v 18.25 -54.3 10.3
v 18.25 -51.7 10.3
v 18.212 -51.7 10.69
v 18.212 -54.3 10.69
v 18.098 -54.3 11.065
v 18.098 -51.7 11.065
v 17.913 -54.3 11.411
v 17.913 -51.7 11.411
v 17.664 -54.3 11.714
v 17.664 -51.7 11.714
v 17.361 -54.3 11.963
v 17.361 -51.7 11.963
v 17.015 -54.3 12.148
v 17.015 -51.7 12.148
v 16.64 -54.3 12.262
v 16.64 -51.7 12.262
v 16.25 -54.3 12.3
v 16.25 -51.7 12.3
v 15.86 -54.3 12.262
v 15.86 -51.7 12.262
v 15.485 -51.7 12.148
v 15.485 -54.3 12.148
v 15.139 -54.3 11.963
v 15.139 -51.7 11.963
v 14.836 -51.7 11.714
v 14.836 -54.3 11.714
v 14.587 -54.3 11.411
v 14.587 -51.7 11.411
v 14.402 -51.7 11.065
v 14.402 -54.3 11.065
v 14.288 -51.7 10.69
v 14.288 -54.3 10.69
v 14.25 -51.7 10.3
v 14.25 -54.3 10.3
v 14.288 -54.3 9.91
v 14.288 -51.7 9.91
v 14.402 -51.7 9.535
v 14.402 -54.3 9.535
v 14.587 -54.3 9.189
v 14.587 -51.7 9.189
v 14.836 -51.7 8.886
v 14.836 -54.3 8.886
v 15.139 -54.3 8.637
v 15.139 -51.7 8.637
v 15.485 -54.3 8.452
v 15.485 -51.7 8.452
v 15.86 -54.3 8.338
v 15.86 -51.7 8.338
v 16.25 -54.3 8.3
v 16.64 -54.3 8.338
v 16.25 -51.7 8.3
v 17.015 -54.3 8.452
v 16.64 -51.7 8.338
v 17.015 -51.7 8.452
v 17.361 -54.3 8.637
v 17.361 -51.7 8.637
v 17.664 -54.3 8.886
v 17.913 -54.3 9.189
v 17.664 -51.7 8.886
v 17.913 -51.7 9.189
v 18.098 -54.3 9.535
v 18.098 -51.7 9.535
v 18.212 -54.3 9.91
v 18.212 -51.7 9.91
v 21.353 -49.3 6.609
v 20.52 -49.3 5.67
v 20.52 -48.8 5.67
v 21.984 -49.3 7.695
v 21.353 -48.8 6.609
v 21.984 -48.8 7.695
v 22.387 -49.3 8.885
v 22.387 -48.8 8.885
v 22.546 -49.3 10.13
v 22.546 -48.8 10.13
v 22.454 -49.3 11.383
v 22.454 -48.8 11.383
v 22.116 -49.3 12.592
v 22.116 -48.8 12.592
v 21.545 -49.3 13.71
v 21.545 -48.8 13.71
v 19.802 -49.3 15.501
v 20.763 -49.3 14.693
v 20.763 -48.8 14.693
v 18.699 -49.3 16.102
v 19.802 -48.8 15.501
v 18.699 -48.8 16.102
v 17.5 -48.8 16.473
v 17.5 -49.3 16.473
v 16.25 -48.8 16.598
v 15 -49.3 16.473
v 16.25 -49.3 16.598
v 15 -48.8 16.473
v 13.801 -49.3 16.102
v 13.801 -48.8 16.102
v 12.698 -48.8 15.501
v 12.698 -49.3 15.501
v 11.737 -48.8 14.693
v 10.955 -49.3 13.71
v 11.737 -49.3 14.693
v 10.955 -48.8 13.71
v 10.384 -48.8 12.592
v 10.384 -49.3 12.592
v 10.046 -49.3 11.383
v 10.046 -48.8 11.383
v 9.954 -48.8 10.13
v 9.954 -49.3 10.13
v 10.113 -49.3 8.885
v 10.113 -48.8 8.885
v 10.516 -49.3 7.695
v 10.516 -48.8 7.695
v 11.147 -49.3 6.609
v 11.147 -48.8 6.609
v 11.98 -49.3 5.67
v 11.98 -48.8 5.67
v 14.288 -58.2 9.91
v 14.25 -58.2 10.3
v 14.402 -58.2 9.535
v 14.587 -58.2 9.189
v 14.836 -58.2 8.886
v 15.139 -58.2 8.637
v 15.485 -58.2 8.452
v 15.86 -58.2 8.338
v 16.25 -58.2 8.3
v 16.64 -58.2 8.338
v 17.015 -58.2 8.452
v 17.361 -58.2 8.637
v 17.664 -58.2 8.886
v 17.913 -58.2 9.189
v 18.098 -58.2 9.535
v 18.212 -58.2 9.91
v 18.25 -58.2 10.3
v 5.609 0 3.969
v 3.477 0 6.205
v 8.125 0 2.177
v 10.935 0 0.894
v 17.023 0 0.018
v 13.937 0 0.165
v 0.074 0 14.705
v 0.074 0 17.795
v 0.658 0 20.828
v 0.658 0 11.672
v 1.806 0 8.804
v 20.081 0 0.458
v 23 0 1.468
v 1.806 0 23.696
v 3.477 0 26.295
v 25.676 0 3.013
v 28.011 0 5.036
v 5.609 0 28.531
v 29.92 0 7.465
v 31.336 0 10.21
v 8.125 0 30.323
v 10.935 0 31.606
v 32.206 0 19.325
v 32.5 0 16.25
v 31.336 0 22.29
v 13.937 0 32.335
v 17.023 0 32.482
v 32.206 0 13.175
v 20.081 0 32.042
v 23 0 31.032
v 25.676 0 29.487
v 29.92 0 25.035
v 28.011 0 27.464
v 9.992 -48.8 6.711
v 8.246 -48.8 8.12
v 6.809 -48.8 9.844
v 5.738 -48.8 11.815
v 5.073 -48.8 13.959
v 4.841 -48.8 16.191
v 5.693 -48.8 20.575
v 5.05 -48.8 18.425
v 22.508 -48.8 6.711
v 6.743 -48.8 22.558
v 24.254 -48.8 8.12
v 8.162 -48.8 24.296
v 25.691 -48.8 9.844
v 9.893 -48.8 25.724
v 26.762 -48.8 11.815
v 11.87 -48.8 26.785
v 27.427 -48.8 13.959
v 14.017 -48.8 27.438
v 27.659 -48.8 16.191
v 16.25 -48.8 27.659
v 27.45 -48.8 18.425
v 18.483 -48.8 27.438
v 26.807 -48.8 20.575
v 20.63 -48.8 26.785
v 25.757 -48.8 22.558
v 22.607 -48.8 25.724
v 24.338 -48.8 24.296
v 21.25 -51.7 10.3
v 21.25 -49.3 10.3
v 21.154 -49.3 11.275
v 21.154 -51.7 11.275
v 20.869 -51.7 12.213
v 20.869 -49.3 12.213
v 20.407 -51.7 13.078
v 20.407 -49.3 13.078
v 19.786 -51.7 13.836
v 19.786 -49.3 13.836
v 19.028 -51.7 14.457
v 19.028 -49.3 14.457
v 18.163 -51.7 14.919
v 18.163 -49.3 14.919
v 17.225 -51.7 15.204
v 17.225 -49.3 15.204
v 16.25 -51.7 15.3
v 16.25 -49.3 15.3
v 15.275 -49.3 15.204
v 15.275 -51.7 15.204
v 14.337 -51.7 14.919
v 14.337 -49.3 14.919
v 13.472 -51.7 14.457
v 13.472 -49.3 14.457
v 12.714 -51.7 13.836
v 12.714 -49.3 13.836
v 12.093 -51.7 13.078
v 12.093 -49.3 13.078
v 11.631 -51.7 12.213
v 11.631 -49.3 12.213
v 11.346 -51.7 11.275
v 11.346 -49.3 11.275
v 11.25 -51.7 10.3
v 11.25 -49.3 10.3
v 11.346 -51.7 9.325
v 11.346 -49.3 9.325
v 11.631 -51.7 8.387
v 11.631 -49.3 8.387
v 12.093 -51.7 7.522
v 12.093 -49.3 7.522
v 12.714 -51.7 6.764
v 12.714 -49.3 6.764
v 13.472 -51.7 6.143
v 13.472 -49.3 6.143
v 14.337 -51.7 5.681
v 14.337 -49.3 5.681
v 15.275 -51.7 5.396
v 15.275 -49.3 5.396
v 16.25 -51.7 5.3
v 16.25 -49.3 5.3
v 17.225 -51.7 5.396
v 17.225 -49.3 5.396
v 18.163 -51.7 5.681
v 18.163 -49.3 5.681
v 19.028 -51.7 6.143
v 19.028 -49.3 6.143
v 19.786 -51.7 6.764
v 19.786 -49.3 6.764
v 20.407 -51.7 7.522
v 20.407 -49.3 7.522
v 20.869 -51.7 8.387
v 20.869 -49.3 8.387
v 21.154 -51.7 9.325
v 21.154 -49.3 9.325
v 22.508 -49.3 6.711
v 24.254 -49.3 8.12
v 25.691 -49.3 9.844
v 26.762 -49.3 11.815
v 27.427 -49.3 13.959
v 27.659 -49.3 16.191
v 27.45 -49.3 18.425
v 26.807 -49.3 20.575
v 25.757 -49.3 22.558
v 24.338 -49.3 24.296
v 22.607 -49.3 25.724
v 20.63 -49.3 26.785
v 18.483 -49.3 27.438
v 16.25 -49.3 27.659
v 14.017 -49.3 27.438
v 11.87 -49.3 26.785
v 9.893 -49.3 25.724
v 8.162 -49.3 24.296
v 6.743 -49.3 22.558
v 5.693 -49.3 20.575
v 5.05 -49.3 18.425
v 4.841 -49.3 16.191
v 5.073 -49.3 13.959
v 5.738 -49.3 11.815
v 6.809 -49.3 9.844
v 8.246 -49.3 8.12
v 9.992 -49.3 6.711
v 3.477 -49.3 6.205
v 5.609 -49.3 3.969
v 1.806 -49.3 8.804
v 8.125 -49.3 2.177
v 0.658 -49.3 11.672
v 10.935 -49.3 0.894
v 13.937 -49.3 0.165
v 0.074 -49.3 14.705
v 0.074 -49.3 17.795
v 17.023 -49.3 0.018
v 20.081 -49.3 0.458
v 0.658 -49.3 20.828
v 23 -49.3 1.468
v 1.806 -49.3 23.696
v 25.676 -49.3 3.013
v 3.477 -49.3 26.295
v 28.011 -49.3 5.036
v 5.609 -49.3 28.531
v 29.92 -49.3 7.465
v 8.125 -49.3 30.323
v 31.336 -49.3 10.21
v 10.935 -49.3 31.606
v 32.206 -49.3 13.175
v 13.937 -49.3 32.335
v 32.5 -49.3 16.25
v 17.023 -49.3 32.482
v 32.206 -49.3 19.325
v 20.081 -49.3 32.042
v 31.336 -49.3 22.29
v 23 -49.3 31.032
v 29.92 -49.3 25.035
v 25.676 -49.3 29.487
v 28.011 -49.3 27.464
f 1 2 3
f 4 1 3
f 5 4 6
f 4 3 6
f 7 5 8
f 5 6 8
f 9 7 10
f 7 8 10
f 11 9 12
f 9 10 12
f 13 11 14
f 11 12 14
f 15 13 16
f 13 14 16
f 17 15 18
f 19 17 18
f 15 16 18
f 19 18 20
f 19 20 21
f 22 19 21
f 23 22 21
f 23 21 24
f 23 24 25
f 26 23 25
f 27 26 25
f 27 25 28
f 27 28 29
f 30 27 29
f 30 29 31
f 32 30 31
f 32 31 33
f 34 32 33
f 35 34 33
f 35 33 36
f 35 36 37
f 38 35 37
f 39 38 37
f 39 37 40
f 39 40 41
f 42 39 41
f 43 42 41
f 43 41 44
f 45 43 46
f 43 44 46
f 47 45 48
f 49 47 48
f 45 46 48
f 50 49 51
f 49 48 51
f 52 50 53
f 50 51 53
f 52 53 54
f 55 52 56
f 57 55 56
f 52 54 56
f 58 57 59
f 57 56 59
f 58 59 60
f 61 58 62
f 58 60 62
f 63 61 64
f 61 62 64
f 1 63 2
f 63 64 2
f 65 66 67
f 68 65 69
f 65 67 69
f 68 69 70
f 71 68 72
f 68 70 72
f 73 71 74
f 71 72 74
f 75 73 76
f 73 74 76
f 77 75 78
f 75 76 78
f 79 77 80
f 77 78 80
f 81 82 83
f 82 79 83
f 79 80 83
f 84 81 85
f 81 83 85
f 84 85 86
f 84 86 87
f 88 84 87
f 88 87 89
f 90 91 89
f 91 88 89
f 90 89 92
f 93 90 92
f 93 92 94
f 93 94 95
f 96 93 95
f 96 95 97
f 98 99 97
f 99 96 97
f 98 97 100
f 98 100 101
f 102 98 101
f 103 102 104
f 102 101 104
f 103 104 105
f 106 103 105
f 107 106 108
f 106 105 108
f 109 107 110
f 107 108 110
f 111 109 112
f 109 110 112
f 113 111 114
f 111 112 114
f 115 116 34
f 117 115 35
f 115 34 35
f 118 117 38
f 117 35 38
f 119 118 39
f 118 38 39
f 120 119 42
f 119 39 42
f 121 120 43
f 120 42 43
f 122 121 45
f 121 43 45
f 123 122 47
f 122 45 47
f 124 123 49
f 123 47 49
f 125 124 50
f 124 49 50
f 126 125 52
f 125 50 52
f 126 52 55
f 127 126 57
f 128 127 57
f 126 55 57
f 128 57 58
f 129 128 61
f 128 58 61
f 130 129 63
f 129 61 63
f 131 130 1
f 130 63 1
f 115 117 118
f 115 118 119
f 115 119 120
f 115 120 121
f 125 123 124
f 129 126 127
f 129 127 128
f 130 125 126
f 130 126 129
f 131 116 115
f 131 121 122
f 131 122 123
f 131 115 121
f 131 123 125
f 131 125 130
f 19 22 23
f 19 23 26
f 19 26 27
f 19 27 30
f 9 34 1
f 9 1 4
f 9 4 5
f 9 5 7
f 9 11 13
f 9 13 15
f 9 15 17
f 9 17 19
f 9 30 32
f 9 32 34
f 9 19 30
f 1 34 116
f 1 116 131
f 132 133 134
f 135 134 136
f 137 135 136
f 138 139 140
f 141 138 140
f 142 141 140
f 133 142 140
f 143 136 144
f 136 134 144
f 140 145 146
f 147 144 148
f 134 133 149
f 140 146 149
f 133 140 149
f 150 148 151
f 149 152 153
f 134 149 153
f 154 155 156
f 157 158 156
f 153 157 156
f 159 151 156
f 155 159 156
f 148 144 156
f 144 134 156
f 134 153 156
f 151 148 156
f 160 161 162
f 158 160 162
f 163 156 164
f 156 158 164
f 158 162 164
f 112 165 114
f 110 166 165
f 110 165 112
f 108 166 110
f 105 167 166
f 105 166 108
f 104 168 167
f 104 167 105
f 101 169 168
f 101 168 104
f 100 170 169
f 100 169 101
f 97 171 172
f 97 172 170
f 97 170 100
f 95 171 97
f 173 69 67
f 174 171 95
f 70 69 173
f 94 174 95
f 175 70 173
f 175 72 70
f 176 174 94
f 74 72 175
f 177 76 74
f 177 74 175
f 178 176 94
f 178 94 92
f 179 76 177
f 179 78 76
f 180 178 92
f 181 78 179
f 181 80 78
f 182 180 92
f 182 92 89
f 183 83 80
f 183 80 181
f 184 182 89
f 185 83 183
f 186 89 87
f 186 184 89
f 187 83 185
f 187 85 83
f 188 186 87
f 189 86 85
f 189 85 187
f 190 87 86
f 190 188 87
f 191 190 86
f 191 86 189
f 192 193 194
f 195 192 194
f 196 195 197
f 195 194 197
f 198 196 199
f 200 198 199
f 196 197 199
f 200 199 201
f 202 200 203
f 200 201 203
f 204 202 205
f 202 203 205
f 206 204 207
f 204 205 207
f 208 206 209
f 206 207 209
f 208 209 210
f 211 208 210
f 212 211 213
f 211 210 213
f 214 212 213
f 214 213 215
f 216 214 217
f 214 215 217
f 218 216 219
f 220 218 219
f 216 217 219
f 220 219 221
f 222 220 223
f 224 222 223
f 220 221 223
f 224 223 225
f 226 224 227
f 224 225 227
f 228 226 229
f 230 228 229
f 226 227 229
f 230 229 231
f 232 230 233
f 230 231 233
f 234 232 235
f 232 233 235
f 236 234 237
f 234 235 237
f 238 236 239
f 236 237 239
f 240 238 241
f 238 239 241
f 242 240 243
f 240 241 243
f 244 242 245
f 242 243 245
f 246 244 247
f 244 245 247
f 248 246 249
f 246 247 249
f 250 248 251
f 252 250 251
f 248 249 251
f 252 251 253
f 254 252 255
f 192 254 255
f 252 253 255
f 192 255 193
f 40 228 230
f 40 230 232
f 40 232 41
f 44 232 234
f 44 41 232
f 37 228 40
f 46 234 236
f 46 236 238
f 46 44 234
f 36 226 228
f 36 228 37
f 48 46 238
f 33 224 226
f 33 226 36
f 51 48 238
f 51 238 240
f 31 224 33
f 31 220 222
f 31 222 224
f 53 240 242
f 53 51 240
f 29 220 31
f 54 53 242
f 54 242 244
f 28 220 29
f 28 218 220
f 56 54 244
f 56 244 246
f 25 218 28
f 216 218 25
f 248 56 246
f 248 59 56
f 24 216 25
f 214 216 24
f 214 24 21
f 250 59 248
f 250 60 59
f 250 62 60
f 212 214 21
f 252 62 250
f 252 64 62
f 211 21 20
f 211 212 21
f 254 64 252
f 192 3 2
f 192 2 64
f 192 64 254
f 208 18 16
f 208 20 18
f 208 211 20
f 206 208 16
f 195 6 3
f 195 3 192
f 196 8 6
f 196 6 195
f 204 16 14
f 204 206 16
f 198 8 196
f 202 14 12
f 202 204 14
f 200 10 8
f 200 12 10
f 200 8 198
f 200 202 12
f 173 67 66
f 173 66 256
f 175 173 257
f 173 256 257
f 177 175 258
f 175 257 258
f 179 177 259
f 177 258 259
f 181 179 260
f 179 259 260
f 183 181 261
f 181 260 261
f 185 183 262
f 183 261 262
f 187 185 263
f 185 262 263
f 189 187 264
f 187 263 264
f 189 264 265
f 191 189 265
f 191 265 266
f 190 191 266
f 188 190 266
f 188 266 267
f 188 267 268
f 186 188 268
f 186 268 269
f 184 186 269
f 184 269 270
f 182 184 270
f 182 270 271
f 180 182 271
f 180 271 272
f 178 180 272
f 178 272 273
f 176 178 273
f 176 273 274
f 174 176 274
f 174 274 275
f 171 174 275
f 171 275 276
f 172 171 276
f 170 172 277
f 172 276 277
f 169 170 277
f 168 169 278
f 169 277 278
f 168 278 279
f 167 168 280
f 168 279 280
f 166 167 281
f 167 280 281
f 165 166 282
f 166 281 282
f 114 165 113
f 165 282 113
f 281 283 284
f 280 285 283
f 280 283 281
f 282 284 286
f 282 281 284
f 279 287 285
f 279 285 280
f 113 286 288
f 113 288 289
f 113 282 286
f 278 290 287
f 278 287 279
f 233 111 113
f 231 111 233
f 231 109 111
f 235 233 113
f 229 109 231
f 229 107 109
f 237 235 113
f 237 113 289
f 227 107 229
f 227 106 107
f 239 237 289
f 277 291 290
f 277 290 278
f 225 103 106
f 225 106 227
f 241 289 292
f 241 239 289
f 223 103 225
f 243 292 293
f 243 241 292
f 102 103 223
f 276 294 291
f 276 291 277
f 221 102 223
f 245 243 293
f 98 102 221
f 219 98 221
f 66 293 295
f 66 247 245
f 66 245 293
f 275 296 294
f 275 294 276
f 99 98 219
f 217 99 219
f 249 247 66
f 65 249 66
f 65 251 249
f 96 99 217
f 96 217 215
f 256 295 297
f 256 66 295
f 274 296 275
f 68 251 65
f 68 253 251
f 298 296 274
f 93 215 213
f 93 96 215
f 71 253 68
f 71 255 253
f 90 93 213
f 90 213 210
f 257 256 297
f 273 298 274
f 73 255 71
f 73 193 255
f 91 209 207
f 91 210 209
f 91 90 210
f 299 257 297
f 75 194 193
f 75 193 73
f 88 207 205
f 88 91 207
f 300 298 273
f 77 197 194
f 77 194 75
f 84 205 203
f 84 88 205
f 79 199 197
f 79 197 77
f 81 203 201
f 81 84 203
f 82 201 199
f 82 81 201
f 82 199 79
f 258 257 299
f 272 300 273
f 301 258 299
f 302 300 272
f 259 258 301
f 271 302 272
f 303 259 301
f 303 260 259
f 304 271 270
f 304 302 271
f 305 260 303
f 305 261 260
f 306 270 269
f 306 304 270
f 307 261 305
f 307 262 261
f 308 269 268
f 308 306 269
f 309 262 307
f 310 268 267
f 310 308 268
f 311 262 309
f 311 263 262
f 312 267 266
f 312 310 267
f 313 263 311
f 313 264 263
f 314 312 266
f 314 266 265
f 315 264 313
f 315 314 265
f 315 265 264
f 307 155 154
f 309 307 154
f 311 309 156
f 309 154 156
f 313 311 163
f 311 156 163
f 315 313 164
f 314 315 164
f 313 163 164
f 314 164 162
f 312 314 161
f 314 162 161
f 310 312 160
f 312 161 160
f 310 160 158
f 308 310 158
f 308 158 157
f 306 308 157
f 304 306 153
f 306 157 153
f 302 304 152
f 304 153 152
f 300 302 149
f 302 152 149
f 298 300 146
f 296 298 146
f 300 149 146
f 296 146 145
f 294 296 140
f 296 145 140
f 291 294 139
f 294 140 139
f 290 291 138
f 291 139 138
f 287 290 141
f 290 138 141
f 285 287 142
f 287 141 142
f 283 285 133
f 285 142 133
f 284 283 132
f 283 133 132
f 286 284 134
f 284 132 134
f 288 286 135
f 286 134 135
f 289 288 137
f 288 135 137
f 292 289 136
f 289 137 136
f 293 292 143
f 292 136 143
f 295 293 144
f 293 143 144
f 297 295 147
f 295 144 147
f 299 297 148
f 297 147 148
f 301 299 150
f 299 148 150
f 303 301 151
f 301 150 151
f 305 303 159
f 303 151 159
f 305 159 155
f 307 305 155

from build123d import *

# Parameters (mm, degrees)
SKETCH001_R  = 16.25
PAD001_DEPTH = 49.3
SKETCH002_R  = 11.408958
POCKET_DEPTH = 0.5
SKETCH003_R  = 6.29816
PAD002_DEPTH = 0.5
SKETCH004_R  = 5
PAD003_DEPTH = 2.4
SKETCH005_R  = 2
PAD004_DEPTH = 2.6
PAD005_DEPTH = 3.9


with BuildPart() as part:
    # Sketch001 → Pad001 (new body)
    with BuildSketch(Plane.XZ):
        with Locations((16.25, 16.25)):
            Circle(SKETCH001_R)
    extrude(amount=PAD001_DEPTH)

    # Sketch002 (on Face3 of Pad001) → Pocket (cut)
    with BuildSketch(Plane.XZ.offset(49.3)):
        with Locations((16.25, 16.25)):
            Circle(SKETCH002_R)
    extrude(amount=-POCKET_DEPTH, mode=Mode.SUBTRACT)

    # Sketch003 (on Face5 of Pocket) → Pad002 (join)
    with BuildSketch(Plane.XZ.offset(48.8)):
        with Locations((16.25, 10.3)):
            Circle(SKETCH003_R)
    extrude(amount=PAD002_DEPTH)

    # Sketch004 (on Face9 of Pad002) → Pad003 (join)
    with BuildSketch(Plane.XZ.offset(49.3)):
        with Locations((16.25, 10.3)):
            Circle(SKETCH004_R)
    extrude(amount=PAD003_DEPTH)

    # Sketch005 (on Face12 of Pad003) → Pad004 (join)
    with BuildSketch(Plane.XZ.offset(51.7)):
        with Locations((16.25, 10.3)):
            Circle(SKETCH005_R)
    extrude(amount=PAD004_DEPTH)

    # Sketch006 (on Face14 of Pad004) → Pad005 (join)
    with BuildSketch(Plane.XZ.offset(54.3)):
        with BuildLine():
            ThreePointArc((14.25, 10.3), (16.25, 8.3), (18.25, 10.3))
            Line((14.25, 10.3), (18.25, 10.3))
        make_face()
    extrude(amount=PAD005_DEPTH)


solid = part.part
